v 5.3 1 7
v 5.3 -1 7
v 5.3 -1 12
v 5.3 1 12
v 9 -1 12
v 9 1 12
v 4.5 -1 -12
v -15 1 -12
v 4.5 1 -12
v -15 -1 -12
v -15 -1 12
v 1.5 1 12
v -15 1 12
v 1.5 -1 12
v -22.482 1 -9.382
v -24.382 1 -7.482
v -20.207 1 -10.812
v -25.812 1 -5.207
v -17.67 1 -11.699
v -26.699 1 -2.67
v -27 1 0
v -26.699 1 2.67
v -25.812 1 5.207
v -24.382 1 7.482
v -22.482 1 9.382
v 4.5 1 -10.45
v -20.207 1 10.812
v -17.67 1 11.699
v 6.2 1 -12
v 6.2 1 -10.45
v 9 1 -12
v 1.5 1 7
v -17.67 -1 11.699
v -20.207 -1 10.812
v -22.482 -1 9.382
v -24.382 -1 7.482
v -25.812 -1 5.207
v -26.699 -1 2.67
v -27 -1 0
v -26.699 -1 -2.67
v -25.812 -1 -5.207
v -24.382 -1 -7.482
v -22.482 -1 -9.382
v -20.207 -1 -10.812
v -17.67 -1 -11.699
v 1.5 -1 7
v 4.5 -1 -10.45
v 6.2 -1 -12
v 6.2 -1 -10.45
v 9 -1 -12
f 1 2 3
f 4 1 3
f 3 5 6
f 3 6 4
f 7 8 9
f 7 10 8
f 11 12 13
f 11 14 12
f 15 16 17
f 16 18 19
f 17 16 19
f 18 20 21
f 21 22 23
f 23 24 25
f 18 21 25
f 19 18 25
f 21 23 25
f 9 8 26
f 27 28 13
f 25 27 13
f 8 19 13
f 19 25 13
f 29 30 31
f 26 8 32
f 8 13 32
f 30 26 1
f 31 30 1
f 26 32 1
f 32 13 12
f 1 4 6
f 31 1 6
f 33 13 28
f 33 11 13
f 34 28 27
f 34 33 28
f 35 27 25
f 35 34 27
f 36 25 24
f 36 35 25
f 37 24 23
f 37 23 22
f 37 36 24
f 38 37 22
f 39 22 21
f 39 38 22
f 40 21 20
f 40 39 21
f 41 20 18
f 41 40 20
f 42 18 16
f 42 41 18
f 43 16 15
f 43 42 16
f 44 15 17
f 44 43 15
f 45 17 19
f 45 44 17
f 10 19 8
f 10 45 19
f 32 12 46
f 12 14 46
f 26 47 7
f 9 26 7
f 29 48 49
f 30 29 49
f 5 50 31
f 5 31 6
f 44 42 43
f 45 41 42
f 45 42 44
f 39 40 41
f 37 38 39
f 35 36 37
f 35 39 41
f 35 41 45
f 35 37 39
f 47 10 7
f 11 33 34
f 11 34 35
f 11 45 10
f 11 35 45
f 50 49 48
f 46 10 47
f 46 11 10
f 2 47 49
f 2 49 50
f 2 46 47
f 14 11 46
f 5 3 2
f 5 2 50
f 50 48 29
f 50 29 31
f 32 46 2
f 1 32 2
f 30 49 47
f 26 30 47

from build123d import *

# Parameters (mm, degrees)
PAD_DEPTH = 1


with BuildPart() as part:
    # Sketch → Pad (new body, symmetric)
    with BuildSketch(Plane.XZ):
        with BuildLine():
            Line((-15, -12), (4.5, -12))
            Line((4.5, -10.45), (4.5, -12))
            Line((6.2, -10.45), (4.5, -10.45))
            Line((6.2, -12), (6.2, -10.45))
            Line((6.2, -12), (9, -12))
            Line((9, -12), (9, 12))
            Line((9, 12), (5.3, 12))
            Line((5.3, 7), (5.3, 12))
            Line((1.5, 7), (5.3, 7))
            Line((1.5, 12), (1.5, 7))
            Line((1.5, 12), (-15, 12))
            ThreePointArc((-15, 12), (-27, 0), (-15, -12))
        make_face()
    extrude(amount=PAD_DEPTH, both=True)


solid = part.part
